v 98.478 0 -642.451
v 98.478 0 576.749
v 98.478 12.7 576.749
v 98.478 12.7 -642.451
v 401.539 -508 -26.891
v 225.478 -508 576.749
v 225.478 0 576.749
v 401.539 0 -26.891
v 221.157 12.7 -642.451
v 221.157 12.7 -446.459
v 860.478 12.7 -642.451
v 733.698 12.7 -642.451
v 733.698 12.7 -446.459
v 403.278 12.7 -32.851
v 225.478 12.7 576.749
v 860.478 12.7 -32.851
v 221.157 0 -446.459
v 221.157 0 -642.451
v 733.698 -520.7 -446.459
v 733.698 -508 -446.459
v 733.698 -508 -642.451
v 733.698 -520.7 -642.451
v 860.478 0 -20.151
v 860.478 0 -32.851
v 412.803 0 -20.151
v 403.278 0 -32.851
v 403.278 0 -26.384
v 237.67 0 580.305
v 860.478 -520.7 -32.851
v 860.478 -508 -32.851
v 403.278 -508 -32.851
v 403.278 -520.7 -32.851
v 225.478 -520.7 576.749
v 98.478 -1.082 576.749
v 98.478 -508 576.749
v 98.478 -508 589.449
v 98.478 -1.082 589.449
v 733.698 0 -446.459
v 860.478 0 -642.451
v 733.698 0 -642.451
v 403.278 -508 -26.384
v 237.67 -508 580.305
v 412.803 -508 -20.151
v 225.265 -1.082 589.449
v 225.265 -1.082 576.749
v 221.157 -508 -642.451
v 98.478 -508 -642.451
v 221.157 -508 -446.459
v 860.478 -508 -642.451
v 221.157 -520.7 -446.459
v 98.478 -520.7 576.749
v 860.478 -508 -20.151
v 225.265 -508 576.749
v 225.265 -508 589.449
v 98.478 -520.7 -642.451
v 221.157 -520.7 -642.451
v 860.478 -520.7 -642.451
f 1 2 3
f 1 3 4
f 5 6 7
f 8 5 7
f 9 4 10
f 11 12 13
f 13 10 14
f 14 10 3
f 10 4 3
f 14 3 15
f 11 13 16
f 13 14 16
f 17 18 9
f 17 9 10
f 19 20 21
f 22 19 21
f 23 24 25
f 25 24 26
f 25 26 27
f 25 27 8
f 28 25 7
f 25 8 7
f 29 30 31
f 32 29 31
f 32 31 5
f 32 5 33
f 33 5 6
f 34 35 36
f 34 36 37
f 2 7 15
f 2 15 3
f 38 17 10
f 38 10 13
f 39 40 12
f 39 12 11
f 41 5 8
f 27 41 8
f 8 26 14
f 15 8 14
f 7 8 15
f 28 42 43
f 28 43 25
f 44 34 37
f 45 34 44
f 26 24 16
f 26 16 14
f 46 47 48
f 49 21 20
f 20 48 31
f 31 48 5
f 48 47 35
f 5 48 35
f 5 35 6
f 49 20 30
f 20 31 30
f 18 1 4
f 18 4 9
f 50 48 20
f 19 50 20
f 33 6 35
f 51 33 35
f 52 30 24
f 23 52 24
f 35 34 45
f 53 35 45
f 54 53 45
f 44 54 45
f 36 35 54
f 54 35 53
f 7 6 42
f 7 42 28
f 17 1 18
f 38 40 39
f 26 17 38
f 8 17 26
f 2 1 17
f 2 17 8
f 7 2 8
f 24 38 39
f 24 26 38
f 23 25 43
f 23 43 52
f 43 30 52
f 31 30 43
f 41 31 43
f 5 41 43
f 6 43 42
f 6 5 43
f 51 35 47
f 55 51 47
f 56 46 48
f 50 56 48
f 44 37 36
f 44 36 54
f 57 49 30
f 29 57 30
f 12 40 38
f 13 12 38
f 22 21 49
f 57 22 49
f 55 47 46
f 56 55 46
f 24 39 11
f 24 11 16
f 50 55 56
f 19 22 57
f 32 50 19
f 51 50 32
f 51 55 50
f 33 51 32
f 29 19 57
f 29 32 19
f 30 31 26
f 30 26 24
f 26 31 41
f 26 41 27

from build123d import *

# Parameters (mm, degrees)
F1_DEPTH  = 12.7
F2_W      = 512.5408172607
F2_H      = 195.9914970187
F3_DEPTH  = 12.701
F7_DEPTH  = 12.7
F8_W      = 457.2
F8_H      = 508
F9_DEPTH  = 12.7
F10_W     = 508
F10_H     = 628.7919113753
F11_DEPTH = 12.7
F12_W     = 126.7874948263
F12_H     = 506.9180233097
F13_DEPTH = 12.7


with BuildPart() as f1:
    # F0 (on Front) → F1 (new body)
    with BuildSketch(Plane.XZ):
        Polygon((225.4775163651, 576.7491500112), (98.4775163651, 576.7491500112), (98.4775163651, -642.4508499888), (860.4775163651, -642.4508499888), (860.4775163651, -32.8508499888), (403.2775163651, -32.8508499888), align=None)
    extrude(amount=-F1_DEPTH)

    # F2 (on face) → F3 (cut, through all)
    with BuildSketch(Plane.XZ):
        with Locations((477.4276018143, -544.4551014795)):
            Rectangle(F2_W, F2_H)
    extrude(amount=-F3_DEPTH, mode=Mode.SUBTRACT)



with BuildPart() as f7:
    # F6 (on offset) → F7 (new body)
    with BuildSketch(Plane.XZ.offset(508)):
        Polygon((403.2775163651, -32.8508499888), (225.4775163651, 576.7491500112), (98.4775163651, 576.7491500112), (98.4775163651, -642.4508499888), (221.1571931839, -642.4508499888), (221.1571931839, -446.4593529701), (733.6980104446, -446.4593529701), (733.6980104446, -642.4508499888), (860.4775163651, -642.4508499888), (860.4775163651, -32.8508499888), align=None)
    extrude(amount=F7_DEPTH)


with BuildPart() as f9:
    # F8 (on face) → F9 (new body)
    with BuildSketch(Plane.XY.offset(-32.8508499888)):
        with Locations((631.8775163651, -254)):
            Rectangle(F8_W, F8_H)
    extrude(amount=F9_DEPTH)


with BuildPart() as f1_1:
    add(f1.part)

    add(f7.part)  # F11 merges F7

    add(f9.part)  # F11 merges F9
    # F10 (on face) → F11 (join)
    with BuildSketch(Plane(origin=(362.830250605, 0, 105.8254897598), x_dir=(0, 1, 0), z_dir=(0.96, 0, 0.28))):
        with Locations((-254, 176.1495237409)):
            Rectangle(F10_W, F10_H)
    extrude(amount=F11_DEPTH)


with BuildPart() as f13:
    # F12 (on face) → F13 (new body)
    with BuildSketch(Plane.XY.offset(576.7491500112)):
        with Locations((161.8712637782, -254.5409883452)):
            Rectangle(F12_W, F12_H)
    extrude(amount=F13_DEPTH)


solid = Compound([f1_1.part, f13.part])
